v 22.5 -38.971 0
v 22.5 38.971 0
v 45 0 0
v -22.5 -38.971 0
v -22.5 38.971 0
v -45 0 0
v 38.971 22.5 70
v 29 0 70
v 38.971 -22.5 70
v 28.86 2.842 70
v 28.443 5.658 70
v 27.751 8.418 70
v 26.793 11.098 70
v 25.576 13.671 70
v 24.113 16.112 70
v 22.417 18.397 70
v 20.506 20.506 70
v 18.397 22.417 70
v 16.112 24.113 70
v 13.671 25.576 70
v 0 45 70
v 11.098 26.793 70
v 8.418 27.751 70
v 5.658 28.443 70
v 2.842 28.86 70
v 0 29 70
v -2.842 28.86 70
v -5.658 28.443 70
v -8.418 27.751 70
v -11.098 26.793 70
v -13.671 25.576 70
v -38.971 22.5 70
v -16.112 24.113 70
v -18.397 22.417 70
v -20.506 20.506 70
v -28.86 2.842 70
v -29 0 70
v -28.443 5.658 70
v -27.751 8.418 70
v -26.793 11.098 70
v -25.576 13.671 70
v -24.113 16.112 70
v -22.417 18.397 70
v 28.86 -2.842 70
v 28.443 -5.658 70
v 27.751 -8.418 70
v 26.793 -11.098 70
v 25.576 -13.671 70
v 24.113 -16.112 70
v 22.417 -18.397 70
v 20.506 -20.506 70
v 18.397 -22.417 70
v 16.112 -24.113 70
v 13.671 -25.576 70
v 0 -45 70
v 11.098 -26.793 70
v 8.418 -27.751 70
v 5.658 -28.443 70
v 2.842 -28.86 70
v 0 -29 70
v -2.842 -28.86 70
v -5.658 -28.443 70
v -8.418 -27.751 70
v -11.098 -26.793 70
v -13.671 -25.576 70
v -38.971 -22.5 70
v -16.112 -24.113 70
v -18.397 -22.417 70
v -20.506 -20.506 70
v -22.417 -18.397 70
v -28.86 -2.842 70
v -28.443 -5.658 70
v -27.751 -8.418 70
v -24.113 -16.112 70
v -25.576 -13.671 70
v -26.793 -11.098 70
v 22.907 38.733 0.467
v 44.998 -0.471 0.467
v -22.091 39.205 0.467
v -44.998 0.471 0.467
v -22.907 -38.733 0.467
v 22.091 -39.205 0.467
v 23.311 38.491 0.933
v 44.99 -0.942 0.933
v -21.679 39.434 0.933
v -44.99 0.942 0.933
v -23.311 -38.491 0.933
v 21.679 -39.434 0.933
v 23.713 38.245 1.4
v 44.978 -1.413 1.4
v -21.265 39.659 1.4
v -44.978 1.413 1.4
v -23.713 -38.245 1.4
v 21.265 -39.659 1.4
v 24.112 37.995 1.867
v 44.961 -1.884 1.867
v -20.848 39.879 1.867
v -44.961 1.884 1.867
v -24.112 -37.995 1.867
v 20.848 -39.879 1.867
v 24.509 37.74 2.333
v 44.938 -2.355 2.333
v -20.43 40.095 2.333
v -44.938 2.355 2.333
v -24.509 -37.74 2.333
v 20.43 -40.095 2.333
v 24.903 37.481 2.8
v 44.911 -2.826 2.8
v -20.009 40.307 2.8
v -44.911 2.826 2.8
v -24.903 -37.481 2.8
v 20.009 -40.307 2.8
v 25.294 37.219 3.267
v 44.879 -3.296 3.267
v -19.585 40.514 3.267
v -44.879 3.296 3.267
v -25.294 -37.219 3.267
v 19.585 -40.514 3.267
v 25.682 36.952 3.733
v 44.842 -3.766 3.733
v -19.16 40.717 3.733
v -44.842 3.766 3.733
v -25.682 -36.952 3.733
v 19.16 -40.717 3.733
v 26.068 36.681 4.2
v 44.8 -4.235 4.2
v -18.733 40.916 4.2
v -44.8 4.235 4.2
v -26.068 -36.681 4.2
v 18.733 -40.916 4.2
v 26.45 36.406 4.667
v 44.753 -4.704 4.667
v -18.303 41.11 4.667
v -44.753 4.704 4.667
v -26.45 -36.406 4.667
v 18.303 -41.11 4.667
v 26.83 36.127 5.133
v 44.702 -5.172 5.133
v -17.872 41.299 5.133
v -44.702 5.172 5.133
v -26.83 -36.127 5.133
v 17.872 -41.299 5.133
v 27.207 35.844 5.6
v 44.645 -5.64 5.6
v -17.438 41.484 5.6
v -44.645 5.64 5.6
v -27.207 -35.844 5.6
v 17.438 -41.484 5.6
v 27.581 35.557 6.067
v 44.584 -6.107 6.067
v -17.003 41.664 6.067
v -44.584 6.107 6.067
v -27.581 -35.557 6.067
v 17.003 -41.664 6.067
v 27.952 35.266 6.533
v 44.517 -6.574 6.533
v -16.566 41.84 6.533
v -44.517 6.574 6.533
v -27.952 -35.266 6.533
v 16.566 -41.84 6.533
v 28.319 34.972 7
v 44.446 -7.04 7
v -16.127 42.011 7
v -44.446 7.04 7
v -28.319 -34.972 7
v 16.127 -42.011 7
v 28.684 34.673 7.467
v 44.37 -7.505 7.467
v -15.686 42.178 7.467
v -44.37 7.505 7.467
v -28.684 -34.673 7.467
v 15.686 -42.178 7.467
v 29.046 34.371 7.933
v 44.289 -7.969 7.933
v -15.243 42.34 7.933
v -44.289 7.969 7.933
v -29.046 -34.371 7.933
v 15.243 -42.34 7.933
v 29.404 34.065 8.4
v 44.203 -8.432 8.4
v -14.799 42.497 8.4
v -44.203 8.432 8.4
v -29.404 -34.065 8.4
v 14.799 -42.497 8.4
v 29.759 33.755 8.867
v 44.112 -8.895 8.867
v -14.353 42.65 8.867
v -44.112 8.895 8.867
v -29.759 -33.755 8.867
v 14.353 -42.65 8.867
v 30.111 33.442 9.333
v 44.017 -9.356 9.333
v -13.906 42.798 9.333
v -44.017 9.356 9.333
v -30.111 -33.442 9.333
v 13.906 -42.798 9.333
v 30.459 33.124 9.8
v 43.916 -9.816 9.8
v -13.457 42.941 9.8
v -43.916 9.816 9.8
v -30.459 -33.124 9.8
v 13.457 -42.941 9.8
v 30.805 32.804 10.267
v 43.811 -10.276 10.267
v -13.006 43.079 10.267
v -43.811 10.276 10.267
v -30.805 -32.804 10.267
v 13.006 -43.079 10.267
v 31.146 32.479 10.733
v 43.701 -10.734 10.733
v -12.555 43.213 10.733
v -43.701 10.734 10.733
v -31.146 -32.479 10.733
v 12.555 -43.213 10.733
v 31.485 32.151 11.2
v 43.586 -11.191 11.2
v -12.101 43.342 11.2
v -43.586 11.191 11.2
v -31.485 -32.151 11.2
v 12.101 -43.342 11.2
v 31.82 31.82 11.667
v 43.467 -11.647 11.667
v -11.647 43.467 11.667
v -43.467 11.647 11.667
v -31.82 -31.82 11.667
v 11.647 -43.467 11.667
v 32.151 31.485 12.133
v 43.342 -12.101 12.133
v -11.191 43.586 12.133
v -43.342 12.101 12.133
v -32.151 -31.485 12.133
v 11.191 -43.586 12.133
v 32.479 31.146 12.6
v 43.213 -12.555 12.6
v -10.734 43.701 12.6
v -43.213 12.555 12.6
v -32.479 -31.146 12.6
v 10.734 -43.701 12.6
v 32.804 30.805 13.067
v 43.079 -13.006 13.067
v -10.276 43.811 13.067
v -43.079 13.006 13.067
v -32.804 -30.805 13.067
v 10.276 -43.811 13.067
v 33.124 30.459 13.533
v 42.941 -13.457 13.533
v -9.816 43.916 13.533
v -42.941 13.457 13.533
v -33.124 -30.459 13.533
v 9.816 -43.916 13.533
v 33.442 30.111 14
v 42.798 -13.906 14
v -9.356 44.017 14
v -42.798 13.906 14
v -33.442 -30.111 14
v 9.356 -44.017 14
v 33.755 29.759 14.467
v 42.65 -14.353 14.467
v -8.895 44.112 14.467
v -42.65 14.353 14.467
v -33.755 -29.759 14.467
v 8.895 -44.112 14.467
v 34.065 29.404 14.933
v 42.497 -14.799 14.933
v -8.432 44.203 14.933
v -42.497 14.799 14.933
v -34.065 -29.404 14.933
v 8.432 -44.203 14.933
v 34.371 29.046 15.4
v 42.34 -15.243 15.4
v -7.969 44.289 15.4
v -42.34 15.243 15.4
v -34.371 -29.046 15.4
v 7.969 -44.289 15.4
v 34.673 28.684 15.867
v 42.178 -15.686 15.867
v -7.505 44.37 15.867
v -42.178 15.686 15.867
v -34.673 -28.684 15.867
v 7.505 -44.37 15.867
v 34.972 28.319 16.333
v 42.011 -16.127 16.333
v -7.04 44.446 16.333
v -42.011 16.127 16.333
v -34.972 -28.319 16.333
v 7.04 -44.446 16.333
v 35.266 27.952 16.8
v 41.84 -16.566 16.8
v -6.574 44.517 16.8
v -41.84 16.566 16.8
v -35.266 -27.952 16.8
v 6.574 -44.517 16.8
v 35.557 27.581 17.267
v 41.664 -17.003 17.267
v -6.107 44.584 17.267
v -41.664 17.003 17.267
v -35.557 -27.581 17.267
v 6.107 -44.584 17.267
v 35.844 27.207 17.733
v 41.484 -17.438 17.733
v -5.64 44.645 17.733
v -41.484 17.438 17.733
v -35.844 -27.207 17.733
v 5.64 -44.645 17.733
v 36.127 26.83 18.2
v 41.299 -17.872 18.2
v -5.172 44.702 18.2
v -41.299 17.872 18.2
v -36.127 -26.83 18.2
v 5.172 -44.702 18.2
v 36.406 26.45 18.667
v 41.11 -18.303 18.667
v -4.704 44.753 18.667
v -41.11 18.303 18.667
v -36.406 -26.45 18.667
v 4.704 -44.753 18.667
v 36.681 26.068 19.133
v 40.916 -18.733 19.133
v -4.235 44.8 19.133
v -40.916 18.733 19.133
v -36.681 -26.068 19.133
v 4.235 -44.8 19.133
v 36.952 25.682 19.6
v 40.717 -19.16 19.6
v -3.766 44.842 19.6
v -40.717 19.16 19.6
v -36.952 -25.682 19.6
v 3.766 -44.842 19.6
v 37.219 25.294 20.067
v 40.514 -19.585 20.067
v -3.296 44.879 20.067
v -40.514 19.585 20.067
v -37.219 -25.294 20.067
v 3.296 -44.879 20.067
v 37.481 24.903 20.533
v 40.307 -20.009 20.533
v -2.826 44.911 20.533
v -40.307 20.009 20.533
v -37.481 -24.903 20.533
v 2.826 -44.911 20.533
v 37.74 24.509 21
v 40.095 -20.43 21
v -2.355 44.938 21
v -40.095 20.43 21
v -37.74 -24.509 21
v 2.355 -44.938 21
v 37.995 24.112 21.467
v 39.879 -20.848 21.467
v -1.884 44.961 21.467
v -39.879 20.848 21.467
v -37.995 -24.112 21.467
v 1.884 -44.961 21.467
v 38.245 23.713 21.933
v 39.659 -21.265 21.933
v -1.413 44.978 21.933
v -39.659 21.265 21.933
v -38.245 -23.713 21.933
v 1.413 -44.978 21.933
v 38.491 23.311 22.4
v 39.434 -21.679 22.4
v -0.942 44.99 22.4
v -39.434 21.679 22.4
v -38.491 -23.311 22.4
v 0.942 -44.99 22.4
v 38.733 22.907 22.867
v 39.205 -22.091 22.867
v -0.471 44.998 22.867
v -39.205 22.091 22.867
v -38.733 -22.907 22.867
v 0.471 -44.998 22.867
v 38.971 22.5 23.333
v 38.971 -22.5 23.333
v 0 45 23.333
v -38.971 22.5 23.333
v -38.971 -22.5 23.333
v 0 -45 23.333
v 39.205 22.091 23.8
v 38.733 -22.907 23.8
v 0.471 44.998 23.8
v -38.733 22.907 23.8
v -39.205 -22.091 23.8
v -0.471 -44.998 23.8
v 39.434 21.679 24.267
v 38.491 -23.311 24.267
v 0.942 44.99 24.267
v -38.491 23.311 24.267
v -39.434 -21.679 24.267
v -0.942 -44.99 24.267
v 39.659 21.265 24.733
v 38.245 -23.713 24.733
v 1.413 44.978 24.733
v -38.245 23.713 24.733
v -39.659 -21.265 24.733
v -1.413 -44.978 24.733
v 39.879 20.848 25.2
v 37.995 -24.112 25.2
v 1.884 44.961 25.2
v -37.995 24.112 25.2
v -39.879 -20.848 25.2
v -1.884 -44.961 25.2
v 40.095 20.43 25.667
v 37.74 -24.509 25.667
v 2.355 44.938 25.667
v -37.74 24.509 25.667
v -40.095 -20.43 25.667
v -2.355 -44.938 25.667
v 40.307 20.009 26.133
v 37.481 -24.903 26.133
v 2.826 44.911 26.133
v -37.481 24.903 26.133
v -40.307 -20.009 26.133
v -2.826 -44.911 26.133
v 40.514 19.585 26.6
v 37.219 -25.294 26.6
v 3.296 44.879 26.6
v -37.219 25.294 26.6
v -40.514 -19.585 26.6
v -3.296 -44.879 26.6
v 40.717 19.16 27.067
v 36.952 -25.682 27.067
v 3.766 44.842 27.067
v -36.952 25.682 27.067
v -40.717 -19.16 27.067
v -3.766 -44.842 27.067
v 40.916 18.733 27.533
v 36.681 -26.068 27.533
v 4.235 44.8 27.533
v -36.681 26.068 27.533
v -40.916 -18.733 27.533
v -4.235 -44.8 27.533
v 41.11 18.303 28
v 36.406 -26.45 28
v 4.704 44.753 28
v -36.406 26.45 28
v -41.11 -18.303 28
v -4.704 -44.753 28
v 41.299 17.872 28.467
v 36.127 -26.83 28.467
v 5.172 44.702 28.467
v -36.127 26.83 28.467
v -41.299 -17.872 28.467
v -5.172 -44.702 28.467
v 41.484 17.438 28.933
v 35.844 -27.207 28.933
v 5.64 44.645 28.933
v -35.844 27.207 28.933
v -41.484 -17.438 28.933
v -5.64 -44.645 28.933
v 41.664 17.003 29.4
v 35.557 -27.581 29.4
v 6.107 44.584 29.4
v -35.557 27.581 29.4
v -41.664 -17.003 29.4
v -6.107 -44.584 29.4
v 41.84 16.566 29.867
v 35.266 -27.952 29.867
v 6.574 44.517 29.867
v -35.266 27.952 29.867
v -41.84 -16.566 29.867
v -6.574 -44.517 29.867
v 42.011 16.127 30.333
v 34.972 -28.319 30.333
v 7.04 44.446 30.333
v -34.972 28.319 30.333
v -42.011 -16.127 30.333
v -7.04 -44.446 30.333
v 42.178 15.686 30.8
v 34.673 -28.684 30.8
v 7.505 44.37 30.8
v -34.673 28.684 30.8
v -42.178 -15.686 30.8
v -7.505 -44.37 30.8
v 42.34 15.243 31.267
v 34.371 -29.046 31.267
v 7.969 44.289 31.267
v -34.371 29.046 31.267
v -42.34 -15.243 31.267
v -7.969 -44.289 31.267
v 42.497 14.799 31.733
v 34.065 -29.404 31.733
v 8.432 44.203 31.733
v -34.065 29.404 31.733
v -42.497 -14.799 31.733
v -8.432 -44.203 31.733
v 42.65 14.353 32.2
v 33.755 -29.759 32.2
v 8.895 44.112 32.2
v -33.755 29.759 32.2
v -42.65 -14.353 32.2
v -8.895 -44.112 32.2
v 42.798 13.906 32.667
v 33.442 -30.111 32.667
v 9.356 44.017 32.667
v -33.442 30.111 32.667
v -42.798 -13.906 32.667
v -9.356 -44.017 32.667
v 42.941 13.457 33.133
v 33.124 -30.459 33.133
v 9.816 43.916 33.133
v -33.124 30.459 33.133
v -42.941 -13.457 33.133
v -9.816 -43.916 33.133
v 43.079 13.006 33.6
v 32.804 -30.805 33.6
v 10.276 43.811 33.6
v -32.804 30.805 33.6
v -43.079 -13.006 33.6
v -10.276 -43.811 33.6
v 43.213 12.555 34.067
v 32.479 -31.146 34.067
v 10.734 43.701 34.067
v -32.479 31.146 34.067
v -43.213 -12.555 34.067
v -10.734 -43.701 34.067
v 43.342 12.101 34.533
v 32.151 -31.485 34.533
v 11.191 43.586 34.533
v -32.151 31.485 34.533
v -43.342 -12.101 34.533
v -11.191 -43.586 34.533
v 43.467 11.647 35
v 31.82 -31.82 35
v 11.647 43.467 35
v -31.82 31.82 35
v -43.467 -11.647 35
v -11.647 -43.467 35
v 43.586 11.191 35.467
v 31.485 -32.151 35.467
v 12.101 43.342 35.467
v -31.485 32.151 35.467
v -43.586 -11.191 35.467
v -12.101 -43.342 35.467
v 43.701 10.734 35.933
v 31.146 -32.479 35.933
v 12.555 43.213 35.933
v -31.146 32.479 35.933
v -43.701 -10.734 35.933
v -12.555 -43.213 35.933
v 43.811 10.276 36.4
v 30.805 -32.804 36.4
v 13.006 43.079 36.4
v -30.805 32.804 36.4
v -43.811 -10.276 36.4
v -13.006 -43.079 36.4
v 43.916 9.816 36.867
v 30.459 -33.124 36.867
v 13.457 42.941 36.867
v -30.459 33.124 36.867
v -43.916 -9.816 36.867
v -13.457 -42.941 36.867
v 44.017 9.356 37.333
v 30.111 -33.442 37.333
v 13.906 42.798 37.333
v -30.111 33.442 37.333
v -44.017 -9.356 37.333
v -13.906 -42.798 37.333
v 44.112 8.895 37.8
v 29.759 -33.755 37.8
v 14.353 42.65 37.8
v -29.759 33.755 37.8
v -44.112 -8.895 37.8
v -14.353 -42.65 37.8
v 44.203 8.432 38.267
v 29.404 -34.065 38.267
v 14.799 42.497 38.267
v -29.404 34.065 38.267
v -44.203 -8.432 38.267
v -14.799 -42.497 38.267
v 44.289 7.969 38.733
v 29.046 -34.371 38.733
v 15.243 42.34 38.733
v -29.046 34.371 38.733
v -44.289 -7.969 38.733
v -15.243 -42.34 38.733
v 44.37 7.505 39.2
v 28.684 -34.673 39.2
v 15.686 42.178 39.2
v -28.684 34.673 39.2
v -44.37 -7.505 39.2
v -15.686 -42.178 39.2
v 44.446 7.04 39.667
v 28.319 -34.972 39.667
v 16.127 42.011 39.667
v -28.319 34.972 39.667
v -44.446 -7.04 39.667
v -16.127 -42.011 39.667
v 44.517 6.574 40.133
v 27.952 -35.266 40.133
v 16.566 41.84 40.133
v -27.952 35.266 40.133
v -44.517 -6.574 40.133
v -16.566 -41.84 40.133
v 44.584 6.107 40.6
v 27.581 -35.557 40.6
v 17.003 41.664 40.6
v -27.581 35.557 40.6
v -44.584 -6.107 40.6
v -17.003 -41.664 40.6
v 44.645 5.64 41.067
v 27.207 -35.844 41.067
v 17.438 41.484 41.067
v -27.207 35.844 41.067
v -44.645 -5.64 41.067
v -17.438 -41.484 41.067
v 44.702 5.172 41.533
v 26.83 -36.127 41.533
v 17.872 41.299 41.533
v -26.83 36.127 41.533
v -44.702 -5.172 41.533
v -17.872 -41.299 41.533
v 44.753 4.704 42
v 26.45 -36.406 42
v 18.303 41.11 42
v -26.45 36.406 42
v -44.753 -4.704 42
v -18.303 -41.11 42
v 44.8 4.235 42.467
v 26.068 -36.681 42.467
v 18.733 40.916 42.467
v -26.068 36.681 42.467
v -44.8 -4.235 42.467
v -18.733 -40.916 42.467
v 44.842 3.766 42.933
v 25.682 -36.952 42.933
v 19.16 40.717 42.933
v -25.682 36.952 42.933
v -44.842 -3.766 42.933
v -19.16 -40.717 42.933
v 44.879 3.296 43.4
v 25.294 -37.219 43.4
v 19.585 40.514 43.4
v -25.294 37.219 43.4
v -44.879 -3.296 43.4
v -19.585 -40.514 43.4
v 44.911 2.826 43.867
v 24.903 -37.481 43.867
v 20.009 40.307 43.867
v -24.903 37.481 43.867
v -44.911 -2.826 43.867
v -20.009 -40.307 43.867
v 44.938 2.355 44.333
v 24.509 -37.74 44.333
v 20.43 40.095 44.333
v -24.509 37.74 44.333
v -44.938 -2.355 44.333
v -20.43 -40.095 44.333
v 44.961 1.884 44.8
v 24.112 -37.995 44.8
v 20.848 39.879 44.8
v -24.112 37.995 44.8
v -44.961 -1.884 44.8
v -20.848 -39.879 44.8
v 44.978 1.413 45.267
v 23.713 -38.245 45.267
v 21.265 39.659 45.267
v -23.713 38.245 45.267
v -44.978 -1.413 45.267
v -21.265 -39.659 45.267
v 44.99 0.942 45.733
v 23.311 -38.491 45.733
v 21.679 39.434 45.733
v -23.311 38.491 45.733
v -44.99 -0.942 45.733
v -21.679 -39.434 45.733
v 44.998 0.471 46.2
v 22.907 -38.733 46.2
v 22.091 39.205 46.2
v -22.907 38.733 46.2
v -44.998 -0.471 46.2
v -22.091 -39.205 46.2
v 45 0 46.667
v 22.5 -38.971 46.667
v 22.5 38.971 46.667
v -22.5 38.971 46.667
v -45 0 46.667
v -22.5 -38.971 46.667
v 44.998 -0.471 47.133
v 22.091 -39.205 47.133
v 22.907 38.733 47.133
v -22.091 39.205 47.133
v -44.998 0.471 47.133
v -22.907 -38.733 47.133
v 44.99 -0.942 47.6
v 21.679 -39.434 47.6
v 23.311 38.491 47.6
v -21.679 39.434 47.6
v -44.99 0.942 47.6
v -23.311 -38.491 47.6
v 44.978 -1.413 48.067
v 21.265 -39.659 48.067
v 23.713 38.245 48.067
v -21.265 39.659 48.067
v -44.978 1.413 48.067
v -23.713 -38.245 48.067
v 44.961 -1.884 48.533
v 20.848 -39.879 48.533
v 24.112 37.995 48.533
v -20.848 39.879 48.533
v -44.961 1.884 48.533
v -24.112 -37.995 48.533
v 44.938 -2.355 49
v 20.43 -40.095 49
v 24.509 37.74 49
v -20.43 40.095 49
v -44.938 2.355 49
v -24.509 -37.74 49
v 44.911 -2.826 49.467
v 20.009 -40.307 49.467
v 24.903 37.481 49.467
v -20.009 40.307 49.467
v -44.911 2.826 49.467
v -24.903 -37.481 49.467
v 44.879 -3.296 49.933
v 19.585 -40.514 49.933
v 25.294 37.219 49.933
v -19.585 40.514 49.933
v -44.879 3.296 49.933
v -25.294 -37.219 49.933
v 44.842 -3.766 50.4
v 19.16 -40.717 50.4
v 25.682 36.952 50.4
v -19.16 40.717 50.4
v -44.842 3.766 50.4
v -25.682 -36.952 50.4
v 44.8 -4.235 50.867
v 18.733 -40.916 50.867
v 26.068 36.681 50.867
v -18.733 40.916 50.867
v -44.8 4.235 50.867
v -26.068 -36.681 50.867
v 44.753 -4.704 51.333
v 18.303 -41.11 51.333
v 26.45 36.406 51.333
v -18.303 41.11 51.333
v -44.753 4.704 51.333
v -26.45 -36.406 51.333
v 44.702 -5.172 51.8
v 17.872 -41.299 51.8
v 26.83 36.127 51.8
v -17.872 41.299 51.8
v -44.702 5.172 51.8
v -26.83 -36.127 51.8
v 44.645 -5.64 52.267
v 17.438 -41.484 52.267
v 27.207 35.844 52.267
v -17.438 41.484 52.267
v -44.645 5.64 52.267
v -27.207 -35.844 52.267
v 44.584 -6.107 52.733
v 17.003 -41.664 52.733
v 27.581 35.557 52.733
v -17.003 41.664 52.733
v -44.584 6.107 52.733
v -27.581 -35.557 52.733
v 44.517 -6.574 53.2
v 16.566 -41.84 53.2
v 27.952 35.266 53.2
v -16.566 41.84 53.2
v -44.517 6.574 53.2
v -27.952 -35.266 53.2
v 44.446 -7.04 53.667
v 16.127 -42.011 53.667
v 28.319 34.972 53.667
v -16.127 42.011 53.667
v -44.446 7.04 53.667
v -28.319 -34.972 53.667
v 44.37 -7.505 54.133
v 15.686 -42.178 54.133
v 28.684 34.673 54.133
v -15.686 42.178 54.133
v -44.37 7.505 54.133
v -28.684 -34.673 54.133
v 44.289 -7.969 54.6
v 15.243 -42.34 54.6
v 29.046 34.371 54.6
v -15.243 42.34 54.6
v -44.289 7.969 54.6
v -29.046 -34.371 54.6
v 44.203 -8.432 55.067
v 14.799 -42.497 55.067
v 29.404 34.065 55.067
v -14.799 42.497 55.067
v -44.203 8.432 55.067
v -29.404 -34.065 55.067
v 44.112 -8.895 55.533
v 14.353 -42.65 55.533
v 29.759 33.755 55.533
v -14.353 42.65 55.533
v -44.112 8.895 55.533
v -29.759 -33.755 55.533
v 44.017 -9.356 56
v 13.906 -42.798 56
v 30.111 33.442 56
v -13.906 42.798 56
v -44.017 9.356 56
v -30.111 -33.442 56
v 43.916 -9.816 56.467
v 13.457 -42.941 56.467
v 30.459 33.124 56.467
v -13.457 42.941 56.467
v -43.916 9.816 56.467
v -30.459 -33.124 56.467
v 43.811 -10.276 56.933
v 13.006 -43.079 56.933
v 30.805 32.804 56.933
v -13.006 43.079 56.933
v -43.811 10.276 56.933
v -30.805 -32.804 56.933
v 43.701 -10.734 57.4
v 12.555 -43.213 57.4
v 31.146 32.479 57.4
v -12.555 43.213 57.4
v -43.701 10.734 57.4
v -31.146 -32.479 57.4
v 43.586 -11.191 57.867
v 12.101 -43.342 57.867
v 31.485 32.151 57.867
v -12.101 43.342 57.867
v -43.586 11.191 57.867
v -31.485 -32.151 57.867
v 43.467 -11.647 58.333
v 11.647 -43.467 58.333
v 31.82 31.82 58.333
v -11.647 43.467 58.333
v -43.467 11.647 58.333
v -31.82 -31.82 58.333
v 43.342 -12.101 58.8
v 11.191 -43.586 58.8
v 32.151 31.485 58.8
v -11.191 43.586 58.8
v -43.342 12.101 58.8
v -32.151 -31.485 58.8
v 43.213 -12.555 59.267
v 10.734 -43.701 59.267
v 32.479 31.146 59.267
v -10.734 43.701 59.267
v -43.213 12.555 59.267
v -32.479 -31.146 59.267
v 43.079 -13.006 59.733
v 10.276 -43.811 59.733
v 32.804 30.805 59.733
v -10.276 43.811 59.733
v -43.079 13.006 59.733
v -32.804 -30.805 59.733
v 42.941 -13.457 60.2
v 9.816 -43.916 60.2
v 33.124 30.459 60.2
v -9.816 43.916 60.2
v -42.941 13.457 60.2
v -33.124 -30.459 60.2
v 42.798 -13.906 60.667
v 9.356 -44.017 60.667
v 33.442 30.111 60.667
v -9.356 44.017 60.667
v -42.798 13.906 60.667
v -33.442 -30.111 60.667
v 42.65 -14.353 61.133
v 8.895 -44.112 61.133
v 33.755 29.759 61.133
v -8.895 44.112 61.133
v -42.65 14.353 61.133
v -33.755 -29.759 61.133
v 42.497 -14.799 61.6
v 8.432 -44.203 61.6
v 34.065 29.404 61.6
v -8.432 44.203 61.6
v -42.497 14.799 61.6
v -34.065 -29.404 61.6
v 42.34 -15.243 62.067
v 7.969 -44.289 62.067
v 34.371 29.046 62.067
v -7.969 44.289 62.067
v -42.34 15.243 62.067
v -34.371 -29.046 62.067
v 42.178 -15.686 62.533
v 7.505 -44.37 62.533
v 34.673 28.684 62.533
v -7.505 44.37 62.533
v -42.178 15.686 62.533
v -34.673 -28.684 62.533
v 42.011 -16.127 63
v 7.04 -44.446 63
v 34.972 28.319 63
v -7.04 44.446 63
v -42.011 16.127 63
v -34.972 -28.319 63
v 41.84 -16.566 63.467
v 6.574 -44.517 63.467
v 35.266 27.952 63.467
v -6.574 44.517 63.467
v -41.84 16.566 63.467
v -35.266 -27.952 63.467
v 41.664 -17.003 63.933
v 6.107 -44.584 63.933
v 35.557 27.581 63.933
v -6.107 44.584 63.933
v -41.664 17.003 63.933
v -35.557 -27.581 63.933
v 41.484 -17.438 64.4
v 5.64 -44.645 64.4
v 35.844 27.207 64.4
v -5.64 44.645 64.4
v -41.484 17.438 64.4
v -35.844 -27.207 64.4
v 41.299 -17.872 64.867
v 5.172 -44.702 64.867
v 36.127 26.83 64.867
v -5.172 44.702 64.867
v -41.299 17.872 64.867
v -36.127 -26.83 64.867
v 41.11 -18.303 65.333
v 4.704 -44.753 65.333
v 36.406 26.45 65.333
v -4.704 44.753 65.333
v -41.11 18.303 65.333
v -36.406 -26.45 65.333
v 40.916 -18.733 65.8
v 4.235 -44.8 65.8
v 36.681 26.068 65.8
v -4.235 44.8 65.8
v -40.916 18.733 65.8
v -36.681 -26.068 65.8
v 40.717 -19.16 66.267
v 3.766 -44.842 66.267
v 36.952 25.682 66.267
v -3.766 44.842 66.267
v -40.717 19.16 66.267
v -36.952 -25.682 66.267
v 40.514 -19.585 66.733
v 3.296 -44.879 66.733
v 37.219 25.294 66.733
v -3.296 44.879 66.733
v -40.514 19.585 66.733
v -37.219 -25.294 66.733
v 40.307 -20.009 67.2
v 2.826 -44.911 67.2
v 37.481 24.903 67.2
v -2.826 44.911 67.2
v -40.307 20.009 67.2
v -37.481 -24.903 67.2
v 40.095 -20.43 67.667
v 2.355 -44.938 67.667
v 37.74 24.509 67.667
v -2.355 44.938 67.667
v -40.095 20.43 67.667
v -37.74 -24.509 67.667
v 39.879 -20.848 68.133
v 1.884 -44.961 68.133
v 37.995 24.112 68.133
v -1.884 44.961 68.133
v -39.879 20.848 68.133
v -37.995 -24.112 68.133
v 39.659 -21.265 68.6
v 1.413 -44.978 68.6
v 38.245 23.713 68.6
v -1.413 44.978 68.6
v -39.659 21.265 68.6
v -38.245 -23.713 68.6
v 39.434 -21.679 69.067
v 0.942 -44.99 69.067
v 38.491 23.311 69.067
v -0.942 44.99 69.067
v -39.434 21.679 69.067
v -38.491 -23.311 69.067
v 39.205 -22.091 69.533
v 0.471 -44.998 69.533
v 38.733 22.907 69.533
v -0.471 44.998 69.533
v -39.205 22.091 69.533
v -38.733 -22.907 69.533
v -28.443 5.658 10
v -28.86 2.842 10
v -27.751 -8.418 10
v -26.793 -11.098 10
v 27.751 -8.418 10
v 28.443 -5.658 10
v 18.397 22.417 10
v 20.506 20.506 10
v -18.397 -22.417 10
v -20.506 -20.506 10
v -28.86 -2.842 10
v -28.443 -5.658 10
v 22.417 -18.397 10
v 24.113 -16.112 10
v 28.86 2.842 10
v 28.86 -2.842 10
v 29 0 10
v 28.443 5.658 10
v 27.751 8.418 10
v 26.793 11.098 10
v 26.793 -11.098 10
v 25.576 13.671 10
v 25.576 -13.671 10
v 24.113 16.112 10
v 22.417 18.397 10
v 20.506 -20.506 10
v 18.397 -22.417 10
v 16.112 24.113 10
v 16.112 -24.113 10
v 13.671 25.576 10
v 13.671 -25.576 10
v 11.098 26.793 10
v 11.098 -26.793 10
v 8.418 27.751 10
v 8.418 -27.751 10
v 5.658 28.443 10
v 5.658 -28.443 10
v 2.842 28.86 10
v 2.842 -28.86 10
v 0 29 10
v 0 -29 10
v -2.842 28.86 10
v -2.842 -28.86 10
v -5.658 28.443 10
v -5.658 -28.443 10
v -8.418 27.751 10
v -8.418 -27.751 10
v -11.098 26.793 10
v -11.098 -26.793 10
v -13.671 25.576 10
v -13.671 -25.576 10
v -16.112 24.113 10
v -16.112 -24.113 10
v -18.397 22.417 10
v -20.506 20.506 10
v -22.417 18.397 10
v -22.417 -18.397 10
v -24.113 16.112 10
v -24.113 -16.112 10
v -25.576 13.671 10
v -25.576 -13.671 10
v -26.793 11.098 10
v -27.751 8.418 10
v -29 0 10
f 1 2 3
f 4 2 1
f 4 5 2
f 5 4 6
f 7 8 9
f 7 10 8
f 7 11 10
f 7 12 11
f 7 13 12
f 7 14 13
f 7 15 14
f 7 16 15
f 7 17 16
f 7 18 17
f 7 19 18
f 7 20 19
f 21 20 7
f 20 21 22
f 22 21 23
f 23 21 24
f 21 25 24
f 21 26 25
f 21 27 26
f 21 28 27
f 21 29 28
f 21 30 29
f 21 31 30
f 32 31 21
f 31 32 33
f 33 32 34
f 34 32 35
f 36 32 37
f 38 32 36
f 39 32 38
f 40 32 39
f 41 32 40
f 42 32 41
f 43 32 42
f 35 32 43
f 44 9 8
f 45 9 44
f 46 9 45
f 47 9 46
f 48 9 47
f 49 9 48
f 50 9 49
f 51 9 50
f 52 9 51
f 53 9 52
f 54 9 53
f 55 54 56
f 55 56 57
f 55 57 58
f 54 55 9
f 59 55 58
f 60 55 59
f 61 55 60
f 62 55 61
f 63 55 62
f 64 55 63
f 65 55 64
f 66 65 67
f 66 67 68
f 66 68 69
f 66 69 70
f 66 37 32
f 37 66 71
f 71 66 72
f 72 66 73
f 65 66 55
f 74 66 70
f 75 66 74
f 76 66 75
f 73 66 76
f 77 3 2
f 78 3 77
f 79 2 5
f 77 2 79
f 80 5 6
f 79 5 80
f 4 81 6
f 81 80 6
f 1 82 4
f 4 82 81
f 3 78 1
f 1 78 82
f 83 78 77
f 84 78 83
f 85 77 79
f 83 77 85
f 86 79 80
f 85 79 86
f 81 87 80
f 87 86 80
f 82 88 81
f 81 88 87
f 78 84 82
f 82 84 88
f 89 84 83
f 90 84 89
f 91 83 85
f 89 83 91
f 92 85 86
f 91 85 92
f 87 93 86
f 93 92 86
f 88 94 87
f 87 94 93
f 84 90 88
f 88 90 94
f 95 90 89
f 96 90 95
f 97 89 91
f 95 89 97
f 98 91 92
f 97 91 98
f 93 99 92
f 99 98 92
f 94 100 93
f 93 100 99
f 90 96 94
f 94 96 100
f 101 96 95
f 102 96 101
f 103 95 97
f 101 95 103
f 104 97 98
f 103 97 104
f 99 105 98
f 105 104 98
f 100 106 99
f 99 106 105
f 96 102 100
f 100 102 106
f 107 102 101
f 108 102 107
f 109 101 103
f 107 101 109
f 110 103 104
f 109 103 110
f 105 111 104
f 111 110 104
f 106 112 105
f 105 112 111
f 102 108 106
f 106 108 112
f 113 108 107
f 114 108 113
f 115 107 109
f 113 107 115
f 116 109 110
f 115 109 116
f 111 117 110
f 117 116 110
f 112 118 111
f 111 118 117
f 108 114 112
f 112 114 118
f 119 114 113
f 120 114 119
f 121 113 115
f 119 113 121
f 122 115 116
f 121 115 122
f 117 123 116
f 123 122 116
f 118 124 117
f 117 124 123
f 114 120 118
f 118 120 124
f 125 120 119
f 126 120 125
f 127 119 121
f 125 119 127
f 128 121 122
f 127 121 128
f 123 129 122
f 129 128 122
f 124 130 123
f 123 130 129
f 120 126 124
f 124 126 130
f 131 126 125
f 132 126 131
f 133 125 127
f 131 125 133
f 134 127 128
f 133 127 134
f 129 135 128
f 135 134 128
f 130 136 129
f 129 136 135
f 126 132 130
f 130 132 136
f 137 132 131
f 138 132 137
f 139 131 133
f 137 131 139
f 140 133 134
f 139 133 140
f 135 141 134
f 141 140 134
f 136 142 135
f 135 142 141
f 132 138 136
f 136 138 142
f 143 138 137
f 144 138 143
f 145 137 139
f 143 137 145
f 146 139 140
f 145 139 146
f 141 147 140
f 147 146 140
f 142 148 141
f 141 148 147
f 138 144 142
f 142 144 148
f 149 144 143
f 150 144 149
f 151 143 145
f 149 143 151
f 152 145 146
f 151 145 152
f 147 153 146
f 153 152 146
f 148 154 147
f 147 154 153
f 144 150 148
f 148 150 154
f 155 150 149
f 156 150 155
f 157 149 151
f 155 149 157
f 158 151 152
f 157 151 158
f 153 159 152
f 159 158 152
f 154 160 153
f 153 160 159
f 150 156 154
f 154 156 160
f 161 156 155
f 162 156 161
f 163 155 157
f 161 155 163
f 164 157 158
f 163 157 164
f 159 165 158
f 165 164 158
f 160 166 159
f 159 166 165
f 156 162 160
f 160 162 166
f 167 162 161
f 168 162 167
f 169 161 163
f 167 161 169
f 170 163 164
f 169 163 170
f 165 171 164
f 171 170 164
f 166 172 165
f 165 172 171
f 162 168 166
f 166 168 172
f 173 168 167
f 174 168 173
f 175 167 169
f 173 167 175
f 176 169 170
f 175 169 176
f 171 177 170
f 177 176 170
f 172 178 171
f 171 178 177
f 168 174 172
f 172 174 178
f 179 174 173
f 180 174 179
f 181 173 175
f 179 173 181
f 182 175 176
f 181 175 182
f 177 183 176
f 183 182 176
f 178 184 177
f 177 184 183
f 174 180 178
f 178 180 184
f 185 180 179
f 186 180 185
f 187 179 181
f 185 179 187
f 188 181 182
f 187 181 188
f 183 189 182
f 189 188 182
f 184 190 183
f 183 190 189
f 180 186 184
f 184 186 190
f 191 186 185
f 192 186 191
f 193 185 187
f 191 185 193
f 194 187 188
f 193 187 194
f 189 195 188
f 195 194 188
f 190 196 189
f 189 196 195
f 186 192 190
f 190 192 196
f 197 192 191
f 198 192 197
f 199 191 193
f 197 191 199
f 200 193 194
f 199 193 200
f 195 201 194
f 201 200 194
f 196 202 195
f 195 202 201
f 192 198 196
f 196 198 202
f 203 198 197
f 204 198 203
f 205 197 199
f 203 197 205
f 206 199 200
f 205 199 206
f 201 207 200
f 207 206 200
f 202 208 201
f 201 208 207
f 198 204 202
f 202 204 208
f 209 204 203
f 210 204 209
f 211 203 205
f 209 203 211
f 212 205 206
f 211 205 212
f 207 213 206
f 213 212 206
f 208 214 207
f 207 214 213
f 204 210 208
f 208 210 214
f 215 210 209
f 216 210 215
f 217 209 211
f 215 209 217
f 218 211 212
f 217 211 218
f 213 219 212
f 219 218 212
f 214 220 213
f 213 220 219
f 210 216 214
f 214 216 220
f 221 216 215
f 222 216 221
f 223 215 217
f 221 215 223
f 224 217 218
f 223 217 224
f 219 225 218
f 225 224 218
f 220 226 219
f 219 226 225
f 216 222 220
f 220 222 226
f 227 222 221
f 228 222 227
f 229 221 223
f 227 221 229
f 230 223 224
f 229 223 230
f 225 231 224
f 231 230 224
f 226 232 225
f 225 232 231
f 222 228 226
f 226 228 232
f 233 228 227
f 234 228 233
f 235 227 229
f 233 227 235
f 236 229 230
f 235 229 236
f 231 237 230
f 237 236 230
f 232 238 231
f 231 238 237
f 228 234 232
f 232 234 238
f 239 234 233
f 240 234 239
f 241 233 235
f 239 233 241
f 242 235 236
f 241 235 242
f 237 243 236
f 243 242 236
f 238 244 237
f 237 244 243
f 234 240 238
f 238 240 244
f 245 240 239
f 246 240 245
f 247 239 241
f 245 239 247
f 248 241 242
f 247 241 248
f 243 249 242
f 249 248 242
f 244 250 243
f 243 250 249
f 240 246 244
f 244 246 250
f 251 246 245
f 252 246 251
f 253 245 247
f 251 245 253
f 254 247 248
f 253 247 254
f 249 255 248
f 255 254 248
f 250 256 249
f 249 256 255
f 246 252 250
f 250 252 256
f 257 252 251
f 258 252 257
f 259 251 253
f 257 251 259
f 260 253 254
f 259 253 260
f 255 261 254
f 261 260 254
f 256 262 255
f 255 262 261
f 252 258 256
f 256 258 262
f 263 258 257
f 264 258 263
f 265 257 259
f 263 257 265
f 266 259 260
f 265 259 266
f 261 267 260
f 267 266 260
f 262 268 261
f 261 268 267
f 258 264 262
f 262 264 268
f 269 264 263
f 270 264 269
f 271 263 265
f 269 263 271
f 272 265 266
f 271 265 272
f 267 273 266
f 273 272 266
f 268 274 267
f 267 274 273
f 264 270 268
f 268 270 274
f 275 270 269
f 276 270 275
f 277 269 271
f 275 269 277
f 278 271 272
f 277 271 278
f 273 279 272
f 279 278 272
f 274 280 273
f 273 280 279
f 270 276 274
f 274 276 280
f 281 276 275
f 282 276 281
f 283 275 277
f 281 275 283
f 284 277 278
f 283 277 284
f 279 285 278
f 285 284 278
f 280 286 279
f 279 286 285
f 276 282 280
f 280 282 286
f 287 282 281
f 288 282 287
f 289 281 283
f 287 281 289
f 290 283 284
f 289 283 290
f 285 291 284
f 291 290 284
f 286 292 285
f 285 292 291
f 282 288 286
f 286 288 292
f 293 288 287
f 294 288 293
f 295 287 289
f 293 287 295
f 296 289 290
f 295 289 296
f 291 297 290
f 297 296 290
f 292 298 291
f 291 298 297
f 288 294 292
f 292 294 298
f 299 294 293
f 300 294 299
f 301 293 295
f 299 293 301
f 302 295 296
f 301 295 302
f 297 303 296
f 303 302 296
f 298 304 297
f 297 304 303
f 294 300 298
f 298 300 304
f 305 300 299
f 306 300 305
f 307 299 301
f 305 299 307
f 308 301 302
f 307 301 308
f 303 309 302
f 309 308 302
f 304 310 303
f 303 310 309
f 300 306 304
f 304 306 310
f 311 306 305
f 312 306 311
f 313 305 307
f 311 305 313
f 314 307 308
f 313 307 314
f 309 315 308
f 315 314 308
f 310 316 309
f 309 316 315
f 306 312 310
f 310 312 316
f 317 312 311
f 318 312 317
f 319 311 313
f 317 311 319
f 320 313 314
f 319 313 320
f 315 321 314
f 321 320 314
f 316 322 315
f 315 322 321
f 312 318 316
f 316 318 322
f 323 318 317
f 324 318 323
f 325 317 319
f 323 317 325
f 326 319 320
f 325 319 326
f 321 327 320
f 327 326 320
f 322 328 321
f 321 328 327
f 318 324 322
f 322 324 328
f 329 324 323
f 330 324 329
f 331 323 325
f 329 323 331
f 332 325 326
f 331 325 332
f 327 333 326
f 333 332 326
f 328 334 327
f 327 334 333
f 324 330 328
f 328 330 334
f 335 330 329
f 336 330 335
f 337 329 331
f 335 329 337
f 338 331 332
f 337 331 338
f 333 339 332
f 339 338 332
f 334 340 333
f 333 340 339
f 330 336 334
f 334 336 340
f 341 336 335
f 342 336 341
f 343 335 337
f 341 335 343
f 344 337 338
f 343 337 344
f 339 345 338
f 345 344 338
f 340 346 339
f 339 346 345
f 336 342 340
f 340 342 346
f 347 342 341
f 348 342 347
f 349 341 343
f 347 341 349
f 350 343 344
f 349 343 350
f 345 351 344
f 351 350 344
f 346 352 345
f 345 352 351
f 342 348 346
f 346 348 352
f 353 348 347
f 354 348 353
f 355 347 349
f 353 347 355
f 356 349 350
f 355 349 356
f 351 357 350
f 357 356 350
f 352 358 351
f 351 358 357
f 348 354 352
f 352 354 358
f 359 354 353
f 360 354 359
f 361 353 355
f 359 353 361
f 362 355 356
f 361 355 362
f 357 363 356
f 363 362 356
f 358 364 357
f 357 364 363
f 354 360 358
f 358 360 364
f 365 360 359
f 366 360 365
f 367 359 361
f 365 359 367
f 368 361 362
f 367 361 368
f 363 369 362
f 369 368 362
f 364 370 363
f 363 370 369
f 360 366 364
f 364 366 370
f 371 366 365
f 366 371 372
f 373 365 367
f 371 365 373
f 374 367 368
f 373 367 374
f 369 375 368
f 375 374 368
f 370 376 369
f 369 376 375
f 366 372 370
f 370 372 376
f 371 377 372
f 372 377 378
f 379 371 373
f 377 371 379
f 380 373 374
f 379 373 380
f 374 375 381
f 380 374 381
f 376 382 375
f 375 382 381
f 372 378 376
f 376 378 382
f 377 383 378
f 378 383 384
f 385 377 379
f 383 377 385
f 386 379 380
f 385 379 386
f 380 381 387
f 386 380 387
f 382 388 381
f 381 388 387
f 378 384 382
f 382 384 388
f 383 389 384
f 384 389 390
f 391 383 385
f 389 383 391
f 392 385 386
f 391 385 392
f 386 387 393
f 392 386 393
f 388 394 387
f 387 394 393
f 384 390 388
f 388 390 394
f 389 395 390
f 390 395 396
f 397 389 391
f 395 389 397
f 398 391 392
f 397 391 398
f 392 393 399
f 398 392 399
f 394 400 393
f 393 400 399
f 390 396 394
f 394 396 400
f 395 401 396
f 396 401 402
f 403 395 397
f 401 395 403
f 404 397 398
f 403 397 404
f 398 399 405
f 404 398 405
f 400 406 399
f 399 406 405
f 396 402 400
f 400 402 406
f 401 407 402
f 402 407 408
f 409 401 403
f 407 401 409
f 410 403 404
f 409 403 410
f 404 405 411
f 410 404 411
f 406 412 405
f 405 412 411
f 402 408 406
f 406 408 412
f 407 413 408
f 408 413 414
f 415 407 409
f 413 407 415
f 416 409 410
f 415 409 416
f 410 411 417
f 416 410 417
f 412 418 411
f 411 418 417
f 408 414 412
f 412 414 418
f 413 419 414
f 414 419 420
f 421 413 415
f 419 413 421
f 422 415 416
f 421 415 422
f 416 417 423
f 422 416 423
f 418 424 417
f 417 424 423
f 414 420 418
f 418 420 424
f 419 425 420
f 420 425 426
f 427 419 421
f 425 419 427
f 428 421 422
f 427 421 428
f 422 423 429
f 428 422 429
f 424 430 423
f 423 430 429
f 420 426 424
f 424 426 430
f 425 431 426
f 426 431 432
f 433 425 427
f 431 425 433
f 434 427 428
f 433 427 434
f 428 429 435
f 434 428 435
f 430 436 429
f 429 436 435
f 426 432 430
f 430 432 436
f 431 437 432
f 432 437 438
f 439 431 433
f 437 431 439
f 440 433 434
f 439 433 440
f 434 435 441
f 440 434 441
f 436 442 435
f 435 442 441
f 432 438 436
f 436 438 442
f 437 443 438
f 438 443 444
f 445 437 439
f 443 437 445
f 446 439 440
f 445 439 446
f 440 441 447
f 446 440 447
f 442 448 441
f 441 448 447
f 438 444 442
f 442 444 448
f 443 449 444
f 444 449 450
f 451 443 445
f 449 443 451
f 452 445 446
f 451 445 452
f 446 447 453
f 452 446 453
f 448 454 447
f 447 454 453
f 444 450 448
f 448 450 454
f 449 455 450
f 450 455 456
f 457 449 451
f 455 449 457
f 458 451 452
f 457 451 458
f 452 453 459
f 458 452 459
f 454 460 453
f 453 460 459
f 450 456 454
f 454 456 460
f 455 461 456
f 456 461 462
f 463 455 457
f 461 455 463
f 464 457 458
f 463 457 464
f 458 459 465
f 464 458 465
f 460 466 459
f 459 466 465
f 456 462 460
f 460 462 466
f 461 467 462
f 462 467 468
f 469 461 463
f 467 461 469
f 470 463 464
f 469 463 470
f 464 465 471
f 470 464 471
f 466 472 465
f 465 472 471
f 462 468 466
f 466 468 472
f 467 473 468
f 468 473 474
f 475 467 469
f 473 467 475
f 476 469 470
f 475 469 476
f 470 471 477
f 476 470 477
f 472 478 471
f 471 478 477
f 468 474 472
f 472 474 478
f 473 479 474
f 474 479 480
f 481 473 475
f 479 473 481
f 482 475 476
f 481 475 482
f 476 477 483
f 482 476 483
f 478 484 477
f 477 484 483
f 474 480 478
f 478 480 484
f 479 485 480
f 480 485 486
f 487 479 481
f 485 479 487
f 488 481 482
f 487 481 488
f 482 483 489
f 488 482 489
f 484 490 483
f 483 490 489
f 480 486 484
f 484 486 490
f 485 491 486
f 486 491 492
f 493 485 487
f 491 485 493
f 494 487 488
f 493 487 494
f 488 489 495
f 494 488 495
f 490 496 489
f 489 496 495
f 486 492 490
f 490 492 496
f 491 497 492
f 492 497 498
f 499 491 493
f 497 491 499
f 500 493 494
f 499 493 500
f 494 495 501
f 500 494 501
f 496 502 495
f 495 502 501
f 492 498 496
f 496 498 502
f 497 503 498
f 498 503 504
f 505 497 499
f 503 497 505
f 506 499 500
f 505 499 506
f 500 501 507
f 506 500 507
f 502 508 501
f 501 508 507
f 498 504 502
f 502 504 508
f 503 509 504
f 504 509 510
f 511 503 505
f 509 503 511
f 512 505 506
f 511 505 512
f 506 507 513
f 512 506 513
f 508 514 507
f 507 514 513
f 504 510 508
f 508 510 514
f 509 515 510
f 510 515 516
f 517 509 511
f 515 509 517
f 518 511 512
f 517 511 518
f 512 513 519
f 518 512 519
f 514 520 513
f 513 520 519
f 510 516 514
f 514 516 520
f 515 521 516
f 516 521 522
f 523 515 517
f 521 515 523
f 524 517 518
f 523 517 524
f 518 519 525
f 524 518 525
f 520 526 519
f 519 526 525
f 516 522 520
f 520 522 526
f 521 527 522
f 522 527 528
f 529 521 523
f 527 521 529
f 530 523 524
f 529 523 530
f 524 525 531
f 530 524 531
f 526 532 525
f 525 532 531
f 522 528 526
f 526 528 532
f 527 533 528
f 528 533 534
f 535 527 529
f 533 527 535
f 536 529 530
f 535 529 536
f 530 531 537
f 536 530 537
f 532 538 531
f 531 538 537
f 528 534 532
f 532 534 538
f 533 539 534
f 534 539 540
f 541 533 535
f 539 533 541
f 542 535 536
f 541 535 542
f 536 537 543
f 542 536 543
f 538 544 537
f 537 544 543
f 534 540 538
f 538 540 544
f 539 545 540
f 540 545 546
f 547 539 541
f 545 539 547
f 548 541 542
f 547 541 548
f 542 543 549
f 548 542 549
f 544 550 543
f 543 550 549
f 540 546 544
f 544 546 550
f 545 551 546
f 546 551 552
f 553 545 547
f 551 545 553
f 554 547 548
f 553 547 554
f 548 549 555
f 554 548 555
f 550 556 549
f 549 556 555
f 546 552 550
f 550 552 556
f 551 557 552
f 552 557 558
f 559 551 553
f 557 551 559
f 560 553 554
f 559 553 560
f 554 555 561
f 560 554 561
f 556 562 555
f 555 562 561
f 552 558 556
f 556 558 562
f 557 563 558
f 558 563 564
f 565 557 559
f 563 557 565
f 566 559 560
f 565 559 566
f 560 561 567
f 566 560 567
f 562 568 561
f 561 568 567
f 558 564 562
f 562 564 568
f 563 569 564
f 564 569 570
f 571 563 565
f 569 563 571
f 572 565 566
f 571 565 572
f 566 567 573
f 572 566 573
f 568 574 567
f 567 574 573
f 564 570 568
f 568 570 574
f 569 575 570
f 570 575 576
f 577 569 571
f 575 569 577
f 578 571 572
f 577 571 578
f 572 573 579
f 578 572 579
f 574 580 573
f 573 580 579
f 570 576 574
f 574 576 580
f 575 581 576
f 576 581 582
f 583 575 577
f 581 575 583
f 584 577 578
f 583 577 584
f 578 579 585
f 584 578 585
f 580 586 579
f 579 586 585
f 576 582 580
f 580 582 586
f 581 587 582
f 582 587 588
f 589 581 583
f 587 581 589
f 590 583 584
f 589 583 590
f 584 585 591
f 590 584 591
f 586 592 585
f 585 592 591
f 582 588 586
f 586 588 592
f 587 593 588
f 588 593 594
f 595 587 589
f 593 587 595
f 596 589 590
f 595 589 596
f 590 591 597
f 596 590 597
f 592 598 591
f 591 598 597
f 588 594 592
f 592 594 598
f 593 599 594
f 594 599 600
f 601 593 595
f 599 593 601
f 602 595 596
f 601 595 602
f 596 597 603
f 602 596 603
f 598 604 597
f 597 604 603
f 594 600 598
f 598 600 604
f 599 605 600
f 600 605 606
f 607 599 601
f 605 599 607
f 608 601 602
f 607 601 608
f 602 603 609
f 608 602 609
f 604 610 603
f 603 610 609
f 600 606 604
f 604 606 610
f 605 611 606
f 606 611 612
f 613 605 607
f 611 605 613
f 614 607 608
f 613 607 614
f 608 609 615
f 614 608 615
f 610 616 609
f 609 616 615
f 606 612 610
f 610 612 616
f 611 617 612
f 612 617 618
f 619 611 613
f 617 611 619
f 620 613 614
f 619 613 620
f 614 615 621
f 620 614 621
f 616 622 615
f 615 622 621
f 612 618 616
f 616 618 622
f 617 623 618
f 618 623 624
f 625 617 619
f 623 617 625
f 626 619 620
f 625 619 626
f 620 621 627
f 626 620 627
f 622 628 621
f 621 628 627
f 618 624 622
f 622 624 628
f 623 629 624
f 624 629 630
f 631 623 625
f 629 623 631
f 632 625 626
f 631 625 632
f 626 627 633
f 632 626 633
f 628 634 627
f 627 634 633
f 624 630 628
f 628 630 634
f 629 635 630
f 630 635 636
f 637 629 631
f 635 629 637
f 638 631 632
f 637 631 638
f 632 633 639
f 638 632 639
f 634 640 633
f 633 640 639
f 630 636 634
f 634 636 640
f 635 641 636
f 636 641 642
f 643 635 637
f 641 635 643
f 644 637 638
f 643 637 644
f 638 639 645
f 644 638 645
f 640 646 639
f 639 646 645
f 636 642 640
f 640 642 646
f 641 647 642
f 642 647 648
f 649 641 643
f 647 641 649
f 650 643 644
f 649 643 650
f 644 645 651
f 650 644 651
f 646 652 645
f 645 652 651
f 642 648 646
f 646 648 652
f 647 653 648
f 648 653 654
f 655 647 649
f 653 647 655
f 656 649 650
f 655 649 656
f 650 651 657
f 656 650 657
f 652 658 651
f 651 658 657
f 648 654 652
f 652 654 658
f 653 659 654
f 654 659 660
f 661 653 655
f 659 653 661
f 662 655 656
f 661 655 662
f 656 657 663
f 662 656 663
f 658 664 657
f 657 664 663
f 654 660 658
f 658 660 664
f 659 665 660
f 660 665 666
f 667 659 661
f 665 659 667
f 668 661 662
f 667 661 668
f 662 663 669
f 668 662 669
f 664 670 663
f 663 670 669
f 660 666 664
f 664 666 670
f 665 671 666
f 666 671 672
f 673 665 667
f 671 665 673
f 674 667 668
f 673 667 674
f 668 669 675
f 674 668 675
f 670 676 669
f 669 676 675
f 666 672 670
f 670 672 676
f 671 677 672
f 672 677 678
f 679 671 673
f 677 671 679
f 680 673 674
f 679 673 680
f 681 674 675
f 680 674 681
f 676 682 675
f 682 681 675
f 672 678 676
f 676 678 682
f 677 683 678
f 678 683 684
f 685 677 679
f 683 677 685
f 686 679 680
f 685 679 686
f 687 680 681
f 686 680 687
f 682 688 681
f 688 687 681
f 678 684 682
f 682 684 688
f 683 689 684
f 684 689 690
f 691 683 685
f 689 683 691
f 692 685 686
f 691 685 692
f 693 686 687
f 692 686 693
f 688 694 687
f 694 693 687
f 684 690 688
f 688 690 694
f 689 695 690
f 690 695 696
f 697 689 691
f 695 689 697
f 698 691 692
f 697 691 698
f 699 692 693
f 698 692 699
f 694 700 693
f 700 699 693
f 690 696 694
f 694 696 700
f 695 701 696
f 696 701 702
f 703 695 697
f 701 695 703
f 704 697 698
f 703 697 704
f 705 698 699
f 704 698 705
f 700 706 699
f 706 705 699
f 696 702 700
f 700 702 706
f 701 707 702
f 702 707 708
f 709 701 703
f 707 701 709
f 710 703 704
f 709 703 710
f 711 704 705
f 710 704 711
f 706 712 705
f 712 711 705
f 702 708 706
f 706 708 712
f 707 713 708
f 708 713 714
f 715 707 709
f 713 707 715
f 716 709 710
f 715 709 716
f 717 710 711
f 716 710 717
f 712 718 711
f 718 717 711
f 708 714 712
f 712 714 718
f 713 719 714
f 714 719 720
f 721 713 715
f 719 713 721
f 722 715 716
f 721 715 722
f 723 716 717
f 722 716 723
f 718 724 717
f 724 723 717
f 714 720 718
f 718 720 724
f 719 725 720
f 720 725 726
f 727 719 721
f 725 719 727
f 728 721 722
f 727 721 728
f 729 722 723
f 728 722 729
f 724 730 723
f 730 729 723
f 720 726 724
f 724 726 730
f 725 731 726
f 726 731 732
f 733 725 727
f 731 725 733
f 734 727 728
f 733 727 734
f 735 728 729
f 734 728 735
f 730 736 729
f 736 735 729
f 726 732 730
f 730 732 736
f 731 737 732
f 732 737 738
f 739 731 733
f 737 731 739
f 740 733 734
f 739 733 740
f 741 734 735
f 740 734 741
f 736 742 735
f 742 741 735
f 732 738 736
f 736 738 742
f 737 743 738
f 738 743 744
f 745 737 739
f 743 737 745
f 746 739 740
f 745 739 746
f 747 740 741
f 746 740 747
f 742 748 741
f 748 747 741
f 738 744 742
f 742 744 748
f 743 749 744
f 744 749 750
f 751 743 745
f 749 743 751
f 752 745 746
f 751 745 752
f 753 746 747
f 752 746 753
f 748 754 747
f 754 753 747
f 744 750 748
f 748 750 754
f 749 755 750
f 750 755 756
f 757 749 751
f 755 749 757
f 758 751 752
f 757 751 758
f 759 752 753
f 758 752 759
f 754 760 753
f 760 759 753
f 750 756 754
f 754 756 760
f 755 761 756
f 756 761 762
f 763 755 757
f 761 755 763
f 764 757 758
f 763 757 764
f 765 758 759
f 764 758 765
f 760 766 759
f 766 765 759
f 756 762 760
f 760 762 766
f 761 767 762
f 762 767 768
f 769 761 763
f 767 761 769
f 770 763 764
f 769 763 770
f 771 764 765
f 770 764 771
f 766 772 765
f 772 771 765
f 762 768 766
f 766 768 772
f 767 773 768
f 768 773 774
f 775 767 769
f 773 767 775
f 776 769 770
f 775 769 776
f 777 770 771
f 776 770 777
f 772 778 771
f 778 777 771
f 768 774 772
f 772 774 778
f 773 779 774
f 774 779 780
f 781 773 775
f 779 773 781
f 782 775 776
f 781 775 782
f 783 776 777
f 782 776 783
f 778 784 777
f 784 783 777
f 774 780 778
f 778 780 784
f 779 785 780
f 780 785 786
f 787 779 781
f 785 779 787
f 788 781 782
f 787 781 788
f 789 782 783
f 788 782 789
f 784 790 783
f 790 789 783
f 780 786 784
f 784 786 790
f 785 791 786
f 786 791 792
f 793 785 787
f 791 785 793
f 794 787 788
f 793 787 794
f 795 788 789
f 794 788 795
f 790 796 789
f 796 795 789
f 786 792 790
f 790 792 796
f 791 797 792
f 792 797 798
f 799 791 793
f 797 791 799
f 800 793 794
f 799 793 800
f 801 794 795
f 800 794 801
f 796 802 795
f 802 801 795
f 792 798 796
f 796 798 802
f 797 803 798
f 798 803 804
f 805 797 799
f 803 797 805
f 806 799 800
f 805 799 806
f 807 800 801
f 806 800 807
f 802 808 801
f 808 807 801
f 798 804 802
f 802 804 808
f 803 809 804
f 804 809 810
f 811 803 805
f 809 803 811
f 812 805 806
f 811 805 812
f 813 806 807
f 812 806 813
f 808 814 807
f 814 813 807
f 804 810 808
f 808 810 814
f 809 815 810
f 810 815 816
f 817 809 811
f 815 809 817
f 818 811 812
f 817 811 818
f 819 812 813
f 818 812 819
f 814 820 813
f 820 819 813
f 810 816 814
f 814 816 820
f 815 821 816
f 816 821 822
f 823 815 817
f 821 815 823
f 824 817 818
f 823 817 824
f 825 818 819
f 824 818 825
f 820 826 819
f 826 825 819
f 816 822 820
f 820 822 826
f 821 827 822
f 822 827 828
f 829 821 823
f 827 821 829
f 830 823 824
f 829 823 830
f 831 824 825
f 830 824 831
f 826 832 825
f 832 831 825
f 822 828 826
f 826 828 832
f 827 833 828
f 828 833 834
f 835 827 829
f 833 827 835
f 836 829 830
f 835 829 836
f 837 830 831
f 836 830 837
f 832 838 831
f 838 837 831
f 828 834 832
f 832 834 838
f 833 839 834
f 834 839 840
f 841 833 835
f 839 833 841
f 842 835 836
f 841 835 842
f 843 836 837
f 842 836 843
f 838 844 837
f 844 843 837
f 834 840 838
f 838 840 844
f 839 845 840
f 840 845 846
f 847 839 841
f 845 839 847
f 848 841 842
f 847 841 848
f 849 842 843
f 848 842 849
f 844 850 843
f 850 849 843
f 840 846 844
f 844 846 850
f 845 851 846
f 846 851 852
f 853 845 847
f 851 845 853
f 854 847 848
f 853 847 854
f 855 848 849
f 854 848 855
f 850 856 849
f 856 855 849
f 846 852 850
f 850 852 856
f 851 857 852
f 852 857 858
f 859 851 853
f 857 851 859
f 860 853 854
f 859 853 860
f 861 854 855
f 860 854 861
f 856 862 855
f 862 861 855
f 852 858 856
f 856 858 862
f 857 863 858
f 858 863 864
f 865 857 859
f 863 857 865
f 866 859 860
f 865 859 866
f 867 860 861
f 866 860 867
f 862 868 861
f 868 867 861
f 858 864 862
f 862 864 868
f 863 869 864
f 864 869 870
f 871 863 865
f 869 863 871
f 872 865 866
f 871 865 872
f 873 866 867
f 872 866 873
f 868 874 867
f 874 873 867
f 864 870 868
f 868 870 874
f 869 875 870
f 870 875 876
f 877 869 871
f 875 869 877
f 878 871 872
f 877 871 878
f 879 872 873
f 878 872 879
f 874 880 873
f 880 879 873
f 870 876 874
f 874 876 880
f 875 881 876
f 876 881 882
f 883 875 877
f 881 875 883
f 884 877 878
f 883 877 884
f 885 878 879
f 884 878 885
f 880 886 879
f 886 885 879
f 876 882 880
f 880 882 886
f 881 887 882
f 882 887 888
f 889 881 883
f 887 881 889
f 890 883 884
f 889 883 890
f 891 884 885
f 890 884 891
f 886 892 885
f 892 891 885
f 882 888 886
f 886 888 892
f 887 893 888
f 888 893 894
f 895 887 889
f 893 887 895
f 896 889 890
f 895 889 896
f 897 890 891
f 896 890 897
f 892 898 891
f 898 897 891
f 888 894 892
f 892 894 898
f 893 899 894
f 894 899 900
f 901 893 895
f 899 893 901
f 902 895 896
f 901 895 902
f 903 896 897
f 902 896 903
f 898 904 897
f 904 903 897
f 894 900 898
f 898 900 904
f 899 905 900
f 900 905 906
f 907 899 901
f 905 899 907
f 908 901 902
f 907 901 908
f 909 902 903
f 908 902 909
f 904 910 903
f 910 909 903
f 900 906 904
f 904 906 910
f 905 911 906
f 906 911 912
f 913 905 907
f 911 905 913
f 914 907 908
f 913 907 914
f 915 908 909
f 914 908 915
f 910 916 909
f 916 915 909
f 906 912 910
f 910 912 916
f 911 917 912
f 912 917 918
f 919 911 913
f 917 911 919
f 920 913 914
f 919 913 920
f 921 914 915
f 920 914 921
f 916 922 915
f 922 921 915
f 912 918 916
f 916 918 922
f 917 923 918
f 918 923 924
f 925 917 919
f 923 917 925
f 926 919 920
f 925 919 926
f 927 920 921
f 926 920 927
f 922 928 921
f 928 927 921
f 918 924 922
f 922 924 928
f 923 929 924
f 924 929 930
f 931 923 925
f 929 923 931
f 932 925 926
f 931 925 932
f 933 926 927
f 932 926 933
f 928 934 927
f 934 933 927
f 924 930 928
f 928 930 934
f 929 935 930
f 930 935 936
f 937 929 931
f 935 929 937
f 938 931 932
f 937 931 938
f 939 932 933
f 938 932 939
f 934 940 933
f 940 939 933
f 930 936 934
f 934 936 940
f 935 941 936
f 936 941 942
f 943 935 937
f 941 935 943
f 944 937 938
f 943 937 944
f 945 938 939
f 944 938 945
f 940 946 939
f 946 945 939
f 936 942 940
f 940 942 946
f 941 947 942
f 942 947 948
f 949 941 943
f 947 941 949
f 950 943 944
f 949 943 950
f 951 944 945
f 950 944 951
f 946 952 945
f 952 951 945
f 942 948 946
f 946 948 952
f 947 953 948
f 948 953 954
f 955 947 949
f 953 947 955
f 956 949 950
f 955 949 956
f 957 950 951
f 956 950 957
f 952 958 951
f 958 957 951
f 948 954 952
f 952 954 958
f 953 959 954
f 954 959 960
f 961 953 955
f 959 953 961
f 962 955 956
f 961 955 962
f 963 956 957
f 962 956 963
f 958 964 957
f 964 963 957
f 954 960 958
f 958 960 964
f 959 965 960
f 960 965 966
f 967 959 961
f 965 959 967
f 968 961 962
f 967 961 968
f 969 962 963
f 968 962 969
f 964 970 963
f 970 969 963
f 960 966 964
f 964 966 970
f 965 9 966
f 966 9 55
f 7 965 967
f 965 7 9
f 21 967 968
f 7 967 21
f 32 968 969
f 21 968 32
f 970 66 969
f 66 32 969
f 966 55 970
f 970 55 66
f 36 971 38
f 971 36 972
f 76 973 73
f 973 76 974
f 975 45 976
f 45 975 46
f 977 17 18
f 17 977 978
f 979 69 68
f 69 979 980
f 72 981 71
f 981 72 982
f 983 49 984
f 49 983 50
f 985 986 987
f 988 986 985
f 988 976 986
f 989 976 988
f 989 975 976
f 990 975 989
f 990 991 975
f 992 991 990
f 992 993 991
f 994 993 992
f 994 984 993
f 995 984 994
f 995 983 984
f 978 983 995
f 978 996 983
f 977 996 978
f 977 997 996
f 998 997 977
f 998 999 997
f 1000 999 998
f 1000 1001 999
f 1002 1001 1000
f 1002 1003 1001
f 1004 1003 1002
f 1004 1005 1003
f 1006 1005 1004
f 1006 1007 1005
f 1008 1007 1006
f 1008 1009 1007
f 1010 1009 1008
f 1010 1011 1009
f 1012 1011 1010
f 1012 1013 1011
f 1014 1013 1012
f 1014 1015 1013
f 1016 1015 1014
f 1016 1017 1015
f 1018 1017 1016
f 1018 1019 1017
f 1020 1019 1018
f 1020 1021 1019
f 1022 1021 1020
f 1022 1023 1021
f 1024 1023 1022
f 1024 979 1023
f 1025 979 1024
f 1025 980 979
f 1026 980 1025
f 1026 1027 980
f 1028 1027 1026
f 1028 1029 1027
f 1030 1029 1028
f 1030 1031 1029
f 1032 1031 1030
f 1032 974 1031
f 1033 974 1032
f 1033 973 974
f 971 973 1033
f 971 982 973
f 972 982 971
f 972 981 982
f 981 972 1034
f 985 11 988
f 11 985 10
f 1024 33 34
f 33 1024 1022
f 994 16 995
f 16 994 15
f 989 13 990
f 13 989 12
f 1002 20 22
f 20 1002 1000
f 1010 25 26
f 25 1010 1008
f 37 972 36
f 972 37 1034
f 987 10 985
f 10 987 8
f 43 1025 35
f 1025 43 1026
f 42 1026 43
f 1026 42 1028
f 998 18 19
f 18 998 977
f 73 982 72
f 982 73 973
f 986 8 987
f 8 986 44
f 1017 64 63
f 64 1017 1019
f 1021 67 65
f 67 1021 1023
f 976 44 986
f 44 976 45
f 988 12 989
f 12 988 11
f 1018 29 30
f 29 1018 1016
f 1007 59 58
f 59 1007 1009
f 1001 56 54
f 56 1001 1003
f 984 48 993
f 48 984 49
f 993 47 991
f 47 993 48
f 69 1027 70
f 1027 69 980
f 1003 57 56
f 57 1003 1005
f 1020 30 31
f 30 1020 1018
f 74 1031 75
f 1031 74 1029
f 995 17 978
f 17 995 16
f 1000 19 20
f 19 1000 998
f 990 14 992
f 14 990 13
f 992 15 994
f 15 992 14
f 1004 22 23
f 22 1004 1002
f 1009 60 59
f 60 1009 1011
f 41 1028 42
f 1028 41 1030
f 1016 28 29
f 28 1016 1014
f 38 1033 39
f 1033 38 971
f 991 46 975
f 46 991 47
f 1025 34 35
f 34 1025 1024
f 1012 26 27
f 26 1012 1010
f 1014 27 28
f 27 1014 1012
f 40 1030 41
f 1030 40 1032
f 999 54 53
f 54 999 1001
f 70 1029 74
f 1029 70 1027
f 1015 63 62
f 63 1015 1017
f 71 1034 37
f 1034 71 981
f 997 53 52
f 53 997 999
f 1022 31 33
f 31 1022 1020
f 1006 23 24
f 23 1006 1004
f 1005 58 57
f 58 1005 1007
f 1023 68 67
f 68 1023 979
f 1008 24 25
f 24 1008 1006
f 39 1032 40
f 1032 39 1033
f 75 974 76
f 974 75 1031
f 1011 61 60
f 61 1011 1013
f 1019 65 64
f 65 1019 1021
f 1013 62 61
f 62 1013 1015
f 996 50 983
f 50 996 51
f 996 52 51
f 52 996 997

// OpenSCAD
difference() {
   multmatrix(m = [ 
    [1, 0, 0, 0],
    [0, 1, 0, 0],
    [0, 0, 1, 0],
    [0, 0, 0, 1]
  ])
  linear_extrude(70, twist = 90, slices = 150)
    circle(r = 45, $fn = 6);
  
  translate([0, 0, 10])
    cylinder(155, 29, 29, $fn = 64);
}
